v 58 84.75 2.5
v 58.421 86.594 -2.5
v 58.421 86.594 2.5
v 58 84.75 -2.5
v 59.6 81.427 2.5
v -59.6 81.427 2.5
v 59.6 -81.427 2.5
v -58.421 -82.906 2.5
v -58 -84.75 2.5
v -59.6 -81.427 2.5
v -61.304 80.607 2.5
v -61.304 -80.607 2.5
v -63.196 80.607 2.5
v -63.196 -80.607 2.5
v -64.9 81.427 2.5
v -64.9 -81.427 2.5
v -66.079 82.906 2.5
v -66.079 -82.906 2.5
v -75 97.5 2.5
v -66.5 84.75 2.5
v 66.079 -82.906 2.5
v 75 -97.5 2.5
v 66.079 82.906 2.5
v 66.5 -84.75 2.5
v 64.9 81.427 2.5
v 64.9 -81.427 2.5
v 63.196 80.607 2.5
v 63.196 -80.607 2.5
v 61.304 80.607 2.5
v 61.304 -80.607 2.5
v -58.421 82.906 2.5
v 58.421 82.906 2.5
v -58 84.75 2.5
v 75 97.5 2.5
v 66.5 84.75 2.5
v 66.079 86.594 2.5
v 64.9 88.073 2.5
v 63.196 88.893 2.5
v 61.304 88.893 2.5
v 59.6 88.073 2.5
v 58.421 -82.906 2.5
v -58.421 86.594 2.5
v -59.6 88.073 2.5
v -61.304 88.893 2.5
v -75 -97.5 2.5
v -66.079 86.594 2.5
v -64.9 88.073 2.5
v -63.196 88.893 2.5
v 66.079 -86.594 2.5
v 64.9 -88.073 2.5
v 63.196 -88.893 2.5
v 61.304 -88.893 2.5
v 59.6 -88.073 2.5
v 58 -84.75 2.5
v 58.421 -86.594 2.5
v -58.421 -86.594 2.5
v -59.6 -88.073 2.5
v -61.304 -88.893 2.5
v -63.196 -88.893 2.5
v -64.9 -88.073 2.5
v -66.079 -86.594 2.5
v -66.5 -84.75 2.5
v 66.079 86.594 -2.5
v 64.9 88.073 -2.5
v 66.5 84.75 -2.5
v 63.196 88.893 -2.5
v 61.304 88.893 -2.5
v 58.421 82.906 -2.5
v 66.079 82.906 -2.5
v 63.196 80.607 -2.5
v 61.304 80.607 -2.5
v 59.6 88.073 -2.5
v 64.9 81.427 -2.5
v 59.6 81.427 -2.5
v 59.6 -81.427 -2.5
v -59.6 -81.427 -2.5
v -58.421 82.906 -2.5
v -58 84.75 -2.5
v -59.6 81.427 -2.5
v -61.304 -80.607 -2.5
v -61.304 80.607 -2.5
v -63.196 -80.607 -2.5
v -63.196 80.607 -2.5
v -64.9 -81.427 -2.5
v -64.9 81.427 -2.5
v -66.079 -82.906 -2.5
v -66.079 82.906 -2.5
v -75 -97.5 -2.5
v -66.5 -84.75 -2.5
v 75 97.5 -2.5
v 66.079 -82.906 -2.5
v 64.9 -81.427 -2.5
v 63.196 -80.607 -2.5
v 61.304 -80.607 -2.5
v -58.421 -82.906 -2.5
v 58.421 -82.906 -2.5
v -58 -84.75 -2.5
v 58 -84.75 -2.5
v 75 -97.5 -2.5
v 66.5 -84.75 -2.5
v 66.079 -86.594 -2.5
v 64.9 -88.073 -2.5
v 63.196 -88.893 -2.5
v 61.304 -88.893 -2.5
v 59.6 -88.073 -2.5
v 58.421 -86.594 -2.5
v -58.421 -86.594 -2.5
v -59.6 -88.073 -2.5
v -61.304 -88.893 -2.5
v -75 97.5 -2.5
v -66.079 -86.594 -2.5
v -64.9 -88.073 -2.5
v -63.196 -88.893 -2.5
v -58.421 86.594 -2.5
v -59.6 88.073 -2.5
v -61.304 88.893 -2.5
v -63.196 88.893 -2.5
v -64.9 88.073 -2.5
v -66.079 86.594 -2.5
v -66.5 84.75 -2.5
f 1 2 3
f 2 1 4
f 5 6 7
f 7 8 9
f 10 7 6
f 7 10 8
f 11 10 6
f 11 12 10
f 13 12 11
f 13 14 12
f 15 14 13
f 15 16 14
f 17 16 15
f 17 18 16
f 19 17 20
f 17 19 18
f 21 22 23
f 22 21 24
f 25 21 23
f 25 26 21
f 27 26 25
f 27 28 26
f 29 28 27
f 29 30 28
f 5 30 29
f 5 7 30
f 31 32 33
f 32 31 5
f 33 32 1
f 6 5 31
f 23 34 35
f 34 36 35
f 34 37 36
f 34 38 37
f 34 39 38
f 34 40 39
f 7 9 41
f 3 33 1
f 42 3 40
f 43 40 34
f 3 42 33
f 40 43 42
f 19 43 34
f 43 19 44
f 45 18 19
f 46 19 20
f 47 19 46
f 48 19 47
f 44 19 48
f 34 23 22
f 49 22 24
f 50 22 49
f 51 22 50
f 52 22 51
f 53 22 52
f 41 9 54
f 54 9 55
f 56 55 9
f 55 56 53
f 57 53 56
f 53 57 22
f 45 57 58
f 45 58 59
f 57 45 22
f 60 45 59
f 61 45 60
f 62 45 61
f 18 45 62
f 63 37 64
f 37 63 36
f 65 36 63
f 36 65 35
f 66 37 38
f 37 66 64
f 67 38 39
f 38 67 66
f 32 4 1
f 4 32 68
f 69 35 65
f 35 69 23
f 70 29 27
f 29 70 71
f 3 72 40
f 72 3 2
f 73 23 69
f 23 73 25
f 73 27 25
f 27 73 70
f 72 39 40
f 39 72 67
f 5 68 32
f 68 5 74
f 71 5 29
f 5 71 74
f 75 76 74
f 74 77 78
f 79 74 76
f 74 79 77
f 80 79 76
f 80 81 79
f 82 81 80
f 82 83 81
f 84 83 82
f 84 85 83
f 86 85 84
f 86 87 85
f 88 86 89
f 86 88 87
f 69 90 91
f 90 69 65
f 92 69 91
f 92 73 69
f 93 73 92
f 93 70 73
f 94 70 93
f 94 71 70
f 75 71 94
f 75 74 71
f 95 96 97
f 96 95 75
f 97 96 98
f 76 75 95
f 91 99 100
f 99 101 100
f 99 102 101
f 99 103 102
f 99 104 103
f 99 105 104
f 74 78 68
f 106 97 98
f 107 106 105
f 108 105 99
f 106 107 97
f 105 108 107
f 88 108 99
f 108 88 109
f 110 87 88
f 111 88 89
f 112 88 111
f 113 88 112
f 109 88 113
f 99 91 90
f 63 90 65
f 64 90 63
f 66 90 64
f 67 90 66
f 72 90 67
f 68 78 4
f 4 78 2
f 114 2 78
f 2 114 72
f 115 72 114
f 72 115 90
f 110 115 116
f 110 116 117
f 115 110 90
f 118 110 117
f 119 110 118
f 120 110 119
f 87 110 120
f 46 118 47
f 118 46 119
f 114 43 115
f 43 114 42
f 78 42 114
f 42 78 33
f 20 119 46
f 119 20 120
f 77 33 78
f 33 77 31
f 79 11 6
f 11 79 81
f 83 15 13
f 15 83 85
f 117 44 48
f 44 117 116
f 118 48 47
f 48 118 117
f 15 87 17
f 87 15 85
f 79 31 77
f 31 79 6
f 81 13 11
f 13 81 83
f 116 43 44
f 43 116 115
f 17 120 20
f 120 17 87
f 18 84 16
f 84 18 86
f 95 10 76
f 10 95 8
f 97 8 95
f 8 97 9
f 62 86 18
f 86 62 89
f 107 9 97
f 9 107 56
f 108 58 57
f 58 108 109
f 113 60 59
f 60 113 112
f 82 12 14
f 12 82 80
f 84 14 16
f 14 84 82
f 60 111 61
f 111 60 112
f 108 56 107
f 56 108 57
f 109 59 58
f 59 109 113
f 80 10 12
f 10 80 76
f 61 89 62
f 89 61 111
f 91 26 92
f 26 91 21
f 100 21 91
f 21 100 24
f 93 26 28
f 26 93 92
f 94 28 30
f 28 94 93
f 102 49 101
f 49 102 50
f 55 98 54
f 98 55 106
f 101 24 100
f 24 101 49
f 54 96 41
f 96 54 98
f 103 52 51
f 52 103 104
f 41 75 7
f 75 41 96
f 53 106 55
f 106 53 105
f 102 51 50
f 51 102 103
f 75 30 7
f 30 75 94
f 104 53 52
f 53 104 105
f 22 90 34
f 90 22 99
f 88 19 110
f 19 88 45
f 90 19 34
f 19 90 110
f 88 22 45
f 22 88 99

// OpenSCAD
// Generated by SolidPython 1.1.3 on 2023-12-20 14:17:19


difference() {
	cube(center = true, size = [150, 195.0000000000, 5]);
	union() {
		translate(v = [62.2500000000, 84.7500000000]) {
			cylinder(center = true, h = 5, r = 4.2500000000);
		}
		translate(v = [-62.2500000000, 84.7500000000]) {
			cylinder(center = true, h = 5, r = 4.2500000000);
		}
		translate(v = [-62.2500000000, -84.7500000000]) {
			cylinder(center = true, h = 5, r = 4.2500000000);
		}
		translate(v = [62.2500000000, -84.7500000000]) {
			cylinder(center = true, h = 5, r = 4.2500000000);
		}
	}
}
/***********************************************
*********      SolidPython code:      **********
************************************************
 
import solid
import numpy as np
import numbers
import pudb
from solid.utils import *
import viewscad
import subprocess
import os
import os.path as osp
import math
import sys

chamfer_extrude=solid.import_scad("./chamfer_extrude.scad")
chamfer_extrude=chamfer_extrude.chamfer_extrude
r = viewscad.Renderer(width=800, height=800)

def debug(model,f_name,path="/home/ts/code/projects/mfd/designs/debug"):
    solid.scad_render_to_file(model,osp.join(path,f_name)+".scad")
#generate position list of wells using offset from center
wells_pos_from_center_4 = lambda offset: [[-offset,offset],
                                        [offset, offset],
                                        [-offset, -offset],
                                        [offset, -offset]]
#wells_pos_from_center_2 = lambda offset: [[0,offset],
#                                        [0, -offset]]
wells_pos_from_center_2 = lambda offset: [[offset,0],
                                        [-offset,0]]

def make_well(dims,shape=None,height=None,dxf=False):
    def circle_cylinder():
        if dxf or (height is None):
            well = solid.circle(r=dims, segments=64)
        else:
            well = solid.cylinder(r=dims, h=height, segments=64, center = True)
        return well
    if dims is None:
        sys.exit("radius needs to be a number")
    if isinstance(dims, numbers.Number):
        well =circle_cylinder()
    elif len(dims)==1:
        if isinstance(dims[1], numbers.Number):
            well =circle_cylinder()
        else:
            sys.exit("radius needs to be a number")
    elif len(dims)==2:
        well = solid.square(dims,center = True)
    elif len(dims)==3:
        well = solid.cube(dims, center = True)
    return well

def wells_top_bottom(center_gap,device_dims=None,shape=None,height=None, positions = None, dxf = False,well_shape=None):
    if well_shape == None:
        well_shape = make_well(device_dims,shape=shape,height=height,dxf=dxf)
    wells = []
    if positions is None:
        offset = radius+radius/2.0
        positions = wells_pos_from_center_2(offset)
    if dxf or (height is None):
        height = 0
    for position in positions:
        if dxf:
            wells.append(solid.translate([position[0],position[1]])(well_shape))
        else:
            wells.append(solid.translate([position[0],position[1],height/2.0])(well_shape))
    return  union()(*wells)

#place wells in four corners 
def four_corner(radius,height=None, positions = None, dxf = False):
    #if well pos not specified set
    #to equally spaced by half radius
    if positions is None:
        offset = radius+radius/2.0
        positions = wells_pos_from_center_4(offset)
    if dxf or (height is None):
        height = 0
    #make wells at positions with specified radius and height
    wells = []
    for position in positions:
        #make circle if making dxf
        if dxf:
            well_shape = solid.circle(r=radius, segments=64)
            well_shape = solid.translate([position[0],position[1]])(well_shape)
        #if stl make cylinder
        else:
            well_shape = solid.cylinder(r=radius, h=height, segments=64, center = True)
            well_shape = solid.translate([position[0],position[1],height/2.0])(well_shape)
        wells.append(well_shape)
    return  union()(*wells)

#generate channels 
def make_channels(length,width,height=0,num_chans=1,max_chans=None,spacing=None, dxf = False,
                  rotate_channels=False):
    if dxf or (height is None):
        height = 0
    #if channel gap not defined, is equal to
    if spacing is None: spacing = width
    #calculate number of channels if fitting max num within given width
    if not max_chans is None:
        import math
        num_chans = math.floor((max_chans-spacing)/(width+spacing))
    #get total width of channel section  
    total_width = (width*num_chans)+(spacing*(num_chans-1))

    #make template channel
    #if rotate_channels: width, length = length, width
    if dxf:
        channel_t = solid.square([length,width],center = True)
    else:
        channel_t = solid.cube([length,width,height], center = True)

    #if number channels is even, offset the first channel to center its gap
    if num_chans % 2 == 0: centering = -(width/2.0+spacing/2.0)
    else: centering = 0
    #move template channel up to align bottom at z = 0 
    #and offset center if necessary
    if dxf:
        channel_t = solid.translate([0,centering])(channel_t)
    else:
        channel_t = solid.translate([0,centering,height/2.0])(channel_t)

    #if rotate_channels: length,width = width,length
    #start making the channels
    channels = []
    for i in range(num_chans):
        #if i=0 there is no translation
        #if i=1, we make the first channel adjacent to second
        direction = i

        #if i>=1, we add channels alternating left and right
        if i >= 1:
            direction = -(i/2.0)
            if i % 2 == 1: direction = (-direction)+0.5
                
        #make channel at right position and add it to channel list
        translation_coords = [0,direction*(width+spacing)]
        #if rotate_channels: translation_coords = [direction*(width+spacing),0]
        if dxf:
            channel = solid.translate(translation_coords)(channel_t)
        else:
            channel = solid.translate([*translation_coords,0])(channel_t)
        channels.append(channel)
    
    #group all channels as one object
    channels = union()(*channels)
    #compute the x,y,z dimensions in order to pass as arguments 
    #for construction of other parts of device (such as the chambers)
    measurements = {'x':(length/2.0,-length/2.0),
                    'y':(total_width/2.0,-total_width/2.0)}
    if not dxf:
        measurements['z'] = (height,0)
    if rotate_channels:
        channels = solid.rotate(90)(channels)
        measurements['x'],measurements['y']=measurements['y'],measurements['x']
    return channels,measurements

def make_chambers(msrs,height=None,extra=0,len_until=None,width=None, dxf = False):
    #computes x,y,z length
    total = lambda x : abs(x[0]) + abs(x[1])
    
    #if specific height if specified
    #otherwise use same height as channels
    if dxf:
        pass
    elif not height is None:
        msrs['z'] = (height,0)
    else:
        msrs['z'] = (0,0)
        
    #make copy of measurements from channels to modify chamber dimensions 
    #and add length to chambers as specified
    chamber_dims = msrs.copy()
    #calculate length of chamber to reach specified offset
    if not len_until is None:
        chamber_len = len_until-(msrs['x'][0])
    #or add specified length to channel length (if not specified, adds 0)
    else:
        chamber_len = msrs['x'][0]+extra
    #set the chamber length based 
    chamber_dims['x'] = (chamber_len/2.0,-(chamber_len/2.0))
    #compute final dimensions of chamber
    if not width is None:
        chamber_dims['y'] = (width/2.0,-width/2.0)
    chamber_dims = [total(size) for size in chamber_dims.values()]
        
    #calculate chamber translation offset to place adjacent to channels
    chamber_trslt = msrs['x'][0]+(chamber_len/2.0)
    #compute chamber translation coordinates to align with channels
    #x = 1 moves chamber above channels
    #x = -1 moves chamber below channels
    if dxf:
        trslt = lambda x : [x*(chamber_trslt),0]
    else:
        trslt = lambda x : [x*(chamber_trslt),0,msrs['z'][0]/2.0]
    
    #function to make chamber at top or at bottom 
    if dxf:
        move = lambda x : solid.translate(trslt(x))(solid.square(chamber_dims, center = True) )
    else:
        move = lambda x : solid.translate(trslt(x))(solid.cube(chamber_dims,center = True))
    #make top and bottom chambers and return them as grouped
    top = move(1)
    bottom = move(-1)
    #chambers=solid.rotate(90)(solid.union()(top,bottom))
    chambers=(solid.union()(top,bottom))

    return chambers

#create alignment features 
def alignment_features(unit,dims,grid_size, mask_size = None, alignment = "hollow", units_from_center = (2.5,2.5), corner_len=None):
    width = grid_size[0]*dims[0]
    length = grid_size[1]*dims[1]
    if mask_size is None and corner_len is None:
        corner_len = (dims[0] + dims[1]) /2 / 8
    corner = lambda thickness_div : solid.union()( solid.square([corner_len,corner_len/thickness_div],center=False), solid.square([corner_len/thickness_div,corner_len],center=False) )
    
    def make_full(thickness_div):
        thickness = corner_len/thickness_div
        tr = solid.translate([0, 0, 0 ])(solid.rotate(180)(corner(thickness_div)))
        tr = solid.translate([thickness/2,thickness/2,0])(tr)
        bl = solid.translate([0, 0, 0 ])(solid.rotate(0)(corner(thickness_div)))
        bl = solid.translate([-thickness/2,-thickness/2,0])(bl)
        return solid.union()(tr,bl)
    
    def make_hollow(thickness_div):
        thickness = corner_len/(thickness_div/2)
        inner = make_full(thickness_div)
        outer = make_full(thickness_div/2)
        hollow = outer - inner 
        return hollow
    
    center = (width /2 , length/2)
    mask_pos = lambda x,y : (center[0] + x*(float(units_from_center[0])*dims[0]), center[1] + y*(float(units_from_center[1])*dims[1]))
    positions = []
    positions.append(mask_pos(1,0))
    positions.append(mask_pos(0,1))
    positions.append(mask_pos(-1,0))
    positions.append(mask_pos(0,-1))
    make_mask = lambda mtype : make_hollow(8) if mtype == "hollow" else make_full(8)
    masks = [ solid.translate([*position,0])(make_mask(alignment)) for position in positions]
    
    solid.scad_render_to_file(solid.union()(*masks),"./designs/open_chamber/masks.scad")
    #return unit - solid.union()(*masks)
    return solid.union()(*masks,unit)

def create_outline(thickness, array, dims, grid_size,):
    width = grid_size[0]*dims[0] + thickness *2
    length = grid_size[1]*dims[1] + thickness *2
    outer = solid.translate([-thickness, -thickness,0])(solid.square([width, length]))
    return outer-array

def create_wall(wall_thickness, outline_thickness, dims, grid_size, wall_height = 2000, dxf = False):
    inner_width = grid_size[0]*dims[0] + outline_thickness *2
    inner_length = grid_size[1]*dims[1] + outline_thickness *2
    outer_width = inner_width + wall_thickness * 2
    outer_length = inner_length + wall_thickness * 2
    outer_pos_x = -outline_thickness-wall_thickness
    outer_pos_y = -outline_thickness-wall_thickness
    inner_pos_x = -outline_thickness
    inner_pos_y = -outline_thickness
    if dxf:
        inner_wall = solid.translate([inner_pos_x,
                                      inner_pos_y,
                                      0])(solid.square([inner_width, inner_length]))
        outer_wall = solid.translate([outer_pos_x,
                                      outer_pos_y,
                                      0])(solid.square([outer_width, outer_length]))

        return outer_wall-inner_wall
    else:
        inner_wall = solid.translate([inner_pos_x,
                                      inner_pos_y,
                                      0])(solid.cube([inner_width, inner_length,wall_height]))
        outer_wall = solid.translate([outer_pos_x,
                                      outer_pos_y,
                                      0])(solid.cube([outer_width, outer_length,wall_height]))

        return outer_wall-inner_wall, {'wall_height': wall_height,
                                       'wall_thickness': wall_thickness,
                                       'inner_width':inner_width,
                                       'inner_length': inner_length,
                                       'outer_width': outer_width,
                                       'outer_length': outer_length,
                                       'outer_pos_x' : outer_pos_x,
                                       'outer_pos_y' : outer_pos_y,
                                       'inner_pos_x' : inner_pos_x,
                                       'inner_pos_y' : inner_pos_y}

def create_thicker_wall(wall_thickness, outer_wall_offset, wall_dims, dims, grid_size, height_start = .2, height_end=2, dxf = False):
    addon_wall,thicker_wall_dims = create_wall(wall_thickness, outer_wall_offset, dims, grid_size, wall_height=height_end-height_start, dxf = False)
    addon_wall = solid.translate([0,0,height_start])(addon_wall)

    thicker_wall_dims['wall_height'] = height_end
    thicker_wall_dims['wall_thickness'] = wall_dims['wall_thickness'] + wall_thickness
    return addon_wall, thicker_wall_dims
 
def add_lock_to_wall(wall,wall_dims,y_offset = 0,cut_ratio=0.7,L_length=3, gap_ratio=0.05, axis="x",width_ratio=1/2):
    # Makes L shape
    def make_L(max_length,length_thickness,max_width,width_thickness,height,y_offset):
        length = solid.cube([max_length,length_thickness,height])
        width = solid.cube([width_thickness,max_width,height])
        width = solid.translate([max_length-(width_thickness),0,0])(width)
        L = solid.union()(width,length)
        debug(L,"L")
        if axis == "x":
            L = solid.rotate(-90)(L)
            L = solid.translate([0,max_length,0])(L)
        else:
            L = solid.rotate(-180)(L)
            L = solid.translate([max_length,max_width,0])(L)
        return solid.translate([0,0,y_offset])(L)
    
    lock_length = L_length
    lock_width = wall_dims['wall_thickness']*width_ratio
    lock_length_thickness = lock_width/2
    lock_width_thickness = lock_width/2
    L_lock = make_L(lock_length,lock_length_thickness,lock_width,lock_width_thickness, wall_dims['wall_height']-y_offset, y_offset)
    
    margin_space = lock_length - lock_length*(1-gap_ratio)
    key_length = lock_length-margin_space
    key_length_thickness = lock_length_thickness-(margin_space*2)
    key_width = lock_width-(margin_space*2)
    key_width_thickness = lock_width_thickness-(margin_space*2)
    L_key = make_L(key_length,key_length_thickness,key_width,key_width_thickness, wall_dims['wall_height']-y_offset, y_offset)
    L_key = solid.translate([margin_space,margin_space,0])(L_key)
    L = solid.union()(L_lock,L_key)
    debug(L,"L")
    
    #Make cube to be used as negative to split frame in a half
    #Can choose if making left or right negative, specify ratio of split
    def make_negative(right,cut_ratio):
        if axis == "x":
            if right:
                length = wall_dims['outer_length']*(1-cut_ratio)
                pos_x = wall_dims['outer_pos_x']+(wall_dims['outer_length']*cut_ratio)
            else:
                length = wall_dims['outer_length']*(cut_ratio)
                pos_x = wall_dims['outer_pos_x'] 
            negative = solid.cube([wall_dims['outer_width'],length, wall_dims['wall_height']])
            negative = solid.translate([wall_dims['outer_pos_y'],pos_x,0])(negative)
        else:
            if right:
                length = wall_dims['outer_width']*(1-cut_ratio)
                pos_x = wall_dims['outer_pos_y']+(wall_dims['outer_width']*cut_ratio)
            else:
                length = wall_dims['outer_width']*(cut_ratio)
                pos_x = wall_dims['outer_pos_y'] 
            negative = solid.cube([length,wall_dims['outer_length'], wall_dims['wall_height']])
            negative = solid.translate([pos_x,wall_dims['outer_pos_x'],0])(negative)
        return negative, pos_x, length 
                      
    #Make negatives
    negative_right, right_half_pos_x, right_half_length = make_negative(True,cut_ratio)
    negative_left, left_half_pos_x, right_half_length = make_negative(False,cut_ratio)
    #Make halves
    left_half = solid.difference()(wall,negative_right)
    right_half = solid.difference()(wall,negative_left)
    def place_L(L, L_length,L_width):
        #Place L on top wall       
        offset_to_center = (wall_dims['wall_thickness']-L_width)/2
        if axis == "x":
            y_pos_top = (wall_dims['outer_pos_y'] +
                    wall_dims['outer_width'] - 
                    L_width - offset_to_center)
            top_L = solid.translate([y_pos_top,
                                     right_half_pos_x-(L_length),
                                     0])(L)
            #Place L on bottom wall       
            y_pos_bottom = wall_dims['outer_pos_y']+offset_to_center
            bottom_L = solid.translate([y_pos_bottom,
                                        right_half_pos_x-L_length,
                                        0])(L)
        else:
            y_pos_top = (wall_dims['outer_pos_x'] +
                    wall_dims['outer_length'] -
                    (L_width+offset_to_center))
            top_L = solid.translate([right_half_pos_x-L_length,
                                     y_pos_top,
                                     0])(L)
            #Place L on bottom wall       
            y_pos_bottom = wall_dims['outer_pos_y']+offset_to_center
            bottom_L = solid.translate([right_half_pos_x-L_length,
                                        y_pos_bottom,
                                        0])(L)
        return bottom_L, top_L
    #Make complimentary L pieces through union and differences
    #Make Lock
    bottom_L_lock, top_L_lock = place_L(L_lock,L_length,lock_width)
    left_half = solid.difference()(left_half,bottom_L_lock)
    left_half = solid.difference()(left_half,top_L_lock)
    #Make Key
    bottom_L_key, top_L_key = place_L(L_key,L_length,lock_width)
    right_half = solid.union()(right_half,bottom_L_key)
    right_half = solid.union()(right_half,top_L_key)
    return left_half, right_half


#build a row x col grid of containment units
def make_unit_array(unit,dims,grid_size, dxf = False, alignment = None, mask_size = None,
                    units_from_center = None,alignment_offset=None, alignment_mark_size=1):
    units = []
    for col in range(grid_size[1]):
        for row in range(grid_size[0]):
            if dxf:
                units.append(solid.translate([row*dims[0],col*dims[1]])(unit))
            else:
                units.append(solid.translate([row*dims[0],col*dims[1],dims[2]/2.0])(unit))
    array = solid.union()(*units)
    if (not alignment is None) and dxf:
        if not alignment_offset is None:
            array = solid.translate([alignment_offset[0],alignment_offset[1]])(array)
        array = alignment_features(array,dims, grid_size, alignment = alignment, mask_size = None, units_from_center = units_from_center,corner_len=alignment_mark_size)
        if not alignment_offset is None:
            array = solid.translate([-alignment_offset[0],-alignment_offset[1]])(array)
    return array


def make_taylor(wells_pos = wells_pos_from_center_4(2.25), well_rad = 1.5 ,
                well_height = 2, chan_w = 0.01, chan_l = 1, chan_h = 0.010 ,
                chan_gap = 0.040, max_chans = None,num_chans=100, chamber_height  = 0.100,
                columns = 1, rows = 1, chamber_len_until=2.25, add_channels = True, add_wells = True, 
                add_chambers = True, save_path = "./", alignment = None, units_from_center = 2,
                mask_size = None, render_stl = False, outline_thickness = 0.050, dxf = True,
                wall_height = 15, wall_thickness = 0.95, casing_x=9, casing_y=9, casing_z=0,rotate_units=0):

    dims = [casing_x, casing_y, casing_z]
    wells = four_corner(well_rad,well_height, dxf = dxf, positions = wells_pos)
    debug(wells,"wells")
    channels, msrs = make_channels(chan_l,chan_w,chan_h,dxf=dxf, spacing = chan_gap, max_chans=max_chans,num_chans=num_chans)
    debug(channels,"channels")
    chambers = make_chambers(msrs,dxf = dxf, height=chamber_height,len_until=chamber_len_until)
    debug(chambers,"chambers")

    #add together and render
    device_parts = []
    if add_channels:
        device_parts.append(channels)
    if add_wells:
        device_parts.append(wells)
    if add_chambers:
        device_parts.append(chambers)
    device=union()(*device_parts)
    device = rotate(rotate_units)(device)

    device=solid.translate([dims[0]/2.0,dims[1]/2.0,0])(device)
    channels = rotate(rotate_units)(channels)
    channels=solid.translate([dims[0]/2,dims[1]/2,0])(channels)
    chambers_wells = union()(wells,chambers)
    chambers_wells = rotate(rotate_units)(chambers_wells)
    chambers_wells=solid.translate([dims[0]/2,dims[1]/2,0])(chambers_wells)

    file_name = str(rows)+'x'+str(columns)+'_units_'
    grid_size = [rows,columns]

    if alignment:
        alignment="full"
    device = make_unit_array(device,dims,grid_size, dxf=dxf, alignment = alignment,
                                 units_from_center = units_from_center)
    channels = make_unit_array(channels,dims,grid_size, dxf=dxf, alignment = alignment,
                                 units_from_center = units_from_center)
    if alignment=="full":
        alignment="hollow"

    chambers_wells = make_unit_array(chambers_wells,dims,grid_size, dxf=dxf, alignment = alignment,
                                 units_from_center =units_from_center)

    def save_model(model,prefix):
        model_fname = os.path.abspath(save_path+prefix+"_"+file_name+".scad")
        solid.scad_render_to_file(model,model_fname)
        return model_fname

    wells_fname = save_model(wells,"wells")
    channels_fname = save_model(channels,"channels")
    device_fname = save_model(device,"device")
    chambers_wells_fname = save_model(chambers_wells,"chambers_wells")
    return (chambers_wells,chambers_wells_fname), (channels,channels_fname), (device,device_fname)

def make_device(design='open',rows=8,columns=6,wells_pos = 4.5,well_offset=3.2, well_rad=3.2,well_height=0.1,
                chan_l=1,chan_w=0.01,chan_h=0.01,chan_gap=0.015,num_chans=101,dxf=True,save_path="./designs/open_chamber/",
                casing_x=9.0,casing_y=18.0,casing_z=0,rotate_units=90,units_from_center=(3,1),chamber_len_until=4.5,
                chamber_width=None,alignment=True, add_wells=True, add_channels=True,add_chambers=True,well_shape=None):

    dims = [casing_x, casing_y, casing_z]
    if design == "open":
        wells_pos=wells_pos_from_center_2(wells_pos)
        wells = wells_top_bottom(well_offset*2,device_dims=well_rad,height=well_height, dxf = dxf, positions = wells_pos,well_shape=well_shape)
    elif design == "closed":
        wells_pos=wells_pos_from_center_4(wells_pos)
        debug(wells,"wells")
        wells = four_corner(well_offset,well_height,device_dims=well_rad, dxf = dxf, positions = wells_pos)
    else:
        print(design+" is not a valid design.\n Choose valid design: 'open' or 'closed'")
        exit()
    wells = rotate(rotate_units)(wells)
    wells=solid.translate([dims[0]/2,dims[1]/2,0])(wells)
    debug(wells,"wells")

    channels, msrs = make_channels(chan_l,chan_w,chan_h,dxf=dxf, spacing = chan_gap, num_chans=num_chans,rotate_channels=False)
    channels = rotate(rotate_units)(channels)
    channels=solid.translate([dims[0]/2,dims[1]/2,0])(channels)

    chambers=make_chambers(msrs,height=None,extra=0,len_until=chamber_len_until, width=chamber_width,dxf = dxf)
    chambers = rotate(rotate_units)(chambers)
    chambers=solid.translate([dims[0]/2,dims[1]/2,0])(chambers)

    device_parts = []
    if add_channels:
        device_parts.append(channels)
    if add_wells:
        device_parts.append(wells)
    if add_chambers:
        device_parts.append(chambers)
    device = union()(*device_parts)
    #device = rotate(rotate_units)(device)
    #device=solid.translate([dims[0]/2.0,dims[1]/2.0,0])(device)

    chambers_wells = []
    if add_chambers:
        chambers_wells.append(chambers)
    if add_wells:
        chambers_wells.append(wells)
    chambers_wells = union()(*chambers_wells)
    #chambers_wells = union()(wells,chambers)
    #chambers_wells = rotate(rotate_units)(chambers_wells)
    #chambers_wells=solid.translate([dims[0]/2,dims[1]/2,0])(chambers_wells)

    file_name = str(rows)+'x'+str(columns)+'_units_'

    grid_size = [rows,columns]
    if alignment:
        alignment="full"
    device = make_unit_array(device,dims,grid_size, dxf=dxf, alignment = alignment,
                                 units_from_center = units_from_center)
    channels = make_unit_array(channels,dims,grid_size, dxf=dxf, alignment = alignment,
                                 units_from_center = units_from_center)
    if alignment=="full":
        alignment="hollow"

    chambers_wells = make_unit_array(chambers_wells,dims,grid_size, dxf=dxf, alignment = alignment,
                                 units_from_center =units_from_center)

    def save_model(model,prefix):
        model_fname = os.path.abspath(save_path+prefix+"_"+file_name+".scad")
        solid.scad_render_to_file(model,model_fname)
        return model_fname

    wells_fname = save_model(wells,"wells")
    channels_fname = save_model(channels,"channels")
    device_fname = save_model(device,"device")
    chambers_wells_fname = save_model(chambers_wells,"chambers_wells")
    return (chambers_wells,chambers_wells_fname), (channels,channels_fname), (device,device_fname)


def make_open_chamber(rows=8,columns=6,wells_pos = wells_pos_from_center_2(4.5), well_rad=3.2,well_height=0.1,
                      chan_l=1,chan_w=0.01,chan_h=0.01,chan_gap=0.015,num_chans=101,dxf=True,save_path="./designs/open_chamber/",
                      casing_x=9.0,casing_y=18.0,casing_z=0,rotate_units=90,units_from_center=(3,1),chamber_len_until=4.5,
                      chamber_width=None,alignment=True, add_wells=True, add_channels=True,add_chambers=True,well_shape=None):

    dims = [casing_x, casing_y, casing_z]
    wells = wells_top_bottom(well_rad,height=well_height, dxf = dxf, positions = wells_pos, well_shape=well_shape)
    channels, msrs = make_channels(chan_l,chan_w,chan_h,dxf=dxf, spacing = chan_gap, num_chans=num_chans,rotate_channels=False)
    chambers=make_chambers(msrs,height=None,extra=0,len_until=chamber_len_until, width=chamber_width,dxf = dxf)
    debug(chambers,"chambers")
    device_parts = []
    if add_channels:
        device_parts.append(channels)
    if add_wells:
        device_parts.append(wells)
    if add_chambers:
        device_parts.append(chambers)
    device = union()(*device_parts)
    device = rotate(rotate_units)(device)
    device=solid.translate([dims[0]/2.0,dims[1]/2.0,0])(device)
    channels = rotate(rotate_units)(channels)
    channels=solid.translate([dims[0]/2,dims[1]/2,0])(channels)
    chambers_wells = union()(wells,chambers)
    chambers_wells = rotate(rotate_units)(chambers_wells)
    chambers_wells=solid.translate([dims[0]/2,dims[1]/2,0])(chambers_wells)

    file_name = str(rows)+'x'+str(columns)+'_units_'

    grid_size = [rows,columns]
    if alignment:
        alignment="full"
    device = make_unit_array(device,dims,grid_size, dxf=dxf, alignment = alignment,
                                 units_from_center = units_from_center)
    channels = make_unit_array(channels,dims,grid_size, dxf=dxf, alignment = alignment,
                                 units_from_center = units_from_center)
    if alignment=="full":
        alignment="hollow"

    chambers_wells = make_unit_array(chambers_wells,dims,grid_size, dxf=dxf, alignment = alignment,
                                 units_from_center =units_from_center)

    def save_model(model,prefix):
        model_fname = os.path.abspath(save_path+prefix+"_"+file_name+".scad")
        solid.scad_render_to_file(model,model_fname)
        return model_fname

    wells_fname = save_model(wells,"wells")
    channels_fname = save_model(channels,"channels")
    device_fname = save_model(device,"device")
    chambers_wells_fname = save_model(chambers_wells,"chambers_wells")
    return (chambers_wells,chambers_wells_fname), (channels,channels_fname), (device,device_fname)

def to_dxf(scad_path):
    dxf_path = scad_path.replace(".scad",".dxf")
    subprocess.call(["openscad", "-o", dxf_path, scad_path])
    import ezdxf
    temp_dxf = ezdxf.readfile(dxf_path)
    temp_dxf.saveas(dxf_path)

#def make_walls(diameter,thickness,grid_size,dims,height=20,segments=256,make_inner=True):
#    wafer_wall_out = solid.cylinder(r=diameter/2,h=height, segments=segments)
#    wafer_wall_in = solid.cylinder(r=(diameter/2-thickness),h=height, segments=segments)
#    wafer_wall = solid.difference()(wafer_wall_out,wafer_wall_in)
#    wafer_wall = solid.translate([grid_size[1]*dims[1]/2.0,grid_size[0]*dims[0]/2.0])(wafer_wall)
#
#    vertical_wall_length = grid_size[1]*dims[1]
#    horizontal_wall_length = grid_size[0]*dims[0]
#    vertical_wall = solid.cube([vertical_wall_length,thickness,height],center = True)
#    vertical_wall = solid.translate([vertical_wall_length/2,0,height/2])(vertical_wall)
#    horizontal_wall = solid.cube([thickness,horizontal_wall_length,height],center = True)
#    horizontal_wall = solid.translate([0,vertical_wall_length/2,height/2])(horizontal_wall)
#    walls = []
#    walls.append(horizontal_wall)
#    walls.append(vertical_wall)
#    for col in range(grid_size[1]):
#        if col == grid_size[1]-1: 
#            walls.append(solid.translate([0,(col+1)*dims[1]])(vertical_wall))
#        elif col > 0 and col < grid_size[1]-1 and make_inner==True:
#            walls.append(solid.translate([0,(col+1)*dims[1]])(vertical_wall))
#    for row in range(grid_size[0]):
#        if row == grid_size[0]-1: 
#            walls.append(solid.translate([(row+1)*dims[0],0])(horizontal_wall))
#        elif row > 0 and row < grid_size[0]-1 and make_inner==True:
#            walls.append(solid.translate([(row+1)*dims[0],0])(horizontal_wall))
#    walls = union()(*walls)
#    wafer_walls = union()(walls,wafer_wall)
#    return walls,wafer_wall,wafer_walls

def make_walls(diameter,thickness,grid_size,dims,height=20,segments=256,make_inner=True,padx=0,pady=0):
    wafer_wall_out = solid.cylinder(r=diameter/2,h=height, segments=segments)
    wafer_wall_in = solid.cylinder(r=(diameter/2-thickness),h=height, segments=segments)
    wafer_wall = solid.difference()(wafer_wall_out,wafer_wall_in)
    wafer_wall = solid.translate([grid_size[1]*dims[1]/2.0,grid_size[0]*dims[0]/2.0])(wafer_wall)

    vertical_wall_length = grid_size[0]*dims[0]+padx
    horizontal_wall_length = grid_size[1]*dims[1]+pady
    vertical_wall = solid.cube([vertical_wall_length,thickness,height],center = True)
    vertical_wall = solid.translate([vertical_wall_length/2-pady/2,-padx/2,height/2])(vertical_wall)
    horizontal_wall = solid.cube([thickness,horizontal_wall_length,height],center = True)
    horizontal_wall = solid.translate([-pady/2,horizontal_wall_length/2-padx/2,height/2])(horizontal_wall)
    walls = []
    walls.append(horizontal_wall)
    walls.append(vertical_wall)
    for col in range(grid_size[1]):
        if col == grid_size[1]-1: 
            walls.append(solid.translate([0,(col+1)*dims[1]+pady])(vertical_wall))
        elif col > 0 and col < grid_size[1]-1 and make_inner==True:
            walls.append(solid.translate([0,(col+1)*dims[1]])(vertical_wall))
    for row in range(grid_size[0]):
        if row == grid_size[0]-1: 
            walls.append(solid.translate([(row+1)*dims[0]+padx,0])(horizontal_wall))
        elif row > 0 and row < grid_size[0]-1 and make_inner==True:
            walls.append(solid.translate([(row+1)*dims[0],0])(horizontal_wall))
    walls = union()(*walls)
    wafer_walls = union()(walls,wafer_wall)
    return walls,wafer_wall,wafer_walls

def save_model(model,base_path,base_name,dxf=True):
    if not os.path.exists(base_path):
        os.makedirs(base_path)
    dxf_path=osp.join(base_path,base_name+".scad")
    solid.scad_render_to_file(model,osp.join(dxf_path))
    if dxf:
        to_dxf(dxf_path)

def make_wafer(diameter,flat_len,thickness):
    wafer = solid.cylinder(r1=diameter/2,r2=diameter/2,h=thickness,segments=512,)()
    x_start_flat=(flat_len/2)
    y_start_flat = math.sqrt(((diameter/2)**2) - (x_start_flat**2) )
    height_delete_flat=diameter/2-y_start_flat
    flat_delete = solid.cube([flat_len,height_delete_flat,thickness],center=False)()
    flat_delete = solid.translate([-flat_len/2,y_start_flat,0])(flat_delete)
    wafer = solid.difference()(wafer,flat_delete)
    wafer = solid.rotate(90)(wafer)
    return wafer

def add_wafer_to_mask(wafer_size,flat_len,mask,grid_size,dims,wafer_line_thickness=0.1,outer_mask_thickness=5,alignment_offset=None):
    def make_wafer_mask(wafer_size,flat_len):
        wafer_mask = make_wafer(wafer_size,flat_len,1)
        wafer_mask = solid.projection()(wafer_mask)
        wafer_mask = solid.translate([grid_size[0]*dims[0]/2.0,grid_size[1]*dims[1]/2.0])(wafer_mask)
        if not alignment_offset is None:
            wafer_mask = solid.translate([-alignment_offset[0],-alignment_offset[1]])(wafer_mask)
        return wafer_mask

    inner_wafer_line_mask = make_wafer_mask(wafer_size-wafer_line_thickness/2,flat_len)
    outer_wafer_line_mask = make_wafer_mask(wafer_size+wafer_line_thickness/2,flat_len)
    outer_wafer_mask = make_wafer_mask(wafer_size+outer_mask_thickness,flat_len)
    outer_wafer_mask = solid.difference()(outer_wafer_mask,outer_wafer_line_mask)
    wafer_mask = solid.union()(outer_wafer_mask,inner_wafer_line_mask)

    return solid.difference()(wafer_mask,mask)

def make_posts(post_shape,post_height):
    posts = solid.linear_extrude(height=post_height)(post_shape)
    return posts

def make_wafer_empty(diameter,flat_len,thickness,margin,notch_len=20,notch_height=5,oversize=1.01):
    diameter*=oversize
    flat_len*=oversize
    wafer = make_wafer(diameter,flat_len,thickness)
    holder = solid.cylinder(r1=diameter/2+margin,r2=diameter/2+margin,h=thickness,segments=512)()
    holder = solid.difference()(holder,wafer)

    x_start_flat=(flat_len/2)
    y_start_flat = math.sqrt(((diameter/2)**2) - (x_start_flat**2) )
    height_delete_flat=diameter/2-y_start_flat
    notch = solid.cube([notch_len,notch_height,thickness],center=False)()
    notch = solid.translate([-notch_len/2,y_start_flat,0])(notch)
    notch = solid.rotate(90)(notch)
    return solid.difference()(holder,notch)

def wafer_print_calibration(diameter,thickness,height,z_offset):
    circles = []
    radii = []
    radii.append(diameter/2.0*0.8)
    radii.append(diameter/2.0*0.6)
    radii.append(diameter/2.0*0.4)
    radii.append(diameter/2.0*0.2)
    for radius in radii:
        inner = solid.cylinder(r1=radius-(thickness/2.0),r2=radius-(thickness/2.0),h=thickness,segments=512,)()
        outer = solid.cylinder(r1=radius+(thickness/2.0),r2=radius+(thickness/2.0),h=thickness,segments=512,)()
        diff = solid.difference()(outer,inner)
        circles.append(diff)
    circles = solid.union()(*circles)
    circles = solid.translate([0,0,z_offset])(circles)
    return circles

def make_rack(wells,dims,grid_size,alignment_offset,rack_x,rack_y,rack_thickness,bolt_width,add_bolts=True):

    #get X and Y dimensions of gride of pipette tips
    X_len = dims[0]*grid_size[0]
    Y_len = dims[1]*grid_size[1]
    #make rack
    rack = solid.cube([rack_x,rack_y,rack_thickness],center=True)

    if add_bolts:
    #add bolt holes
        bolt_hole=solid.cylinder(r=bolt_width/2,h=rack_thickness,center=True)()
        bolt_holes = []
        bolt_holes.append(solid.translate([rack_x/2-1.5*bolt_width,rack_y/2-1.5*bolt_width])(bolt_hole))
        bolt_holes.append(solid.translate([-rack_x/2+1.5*bolt_width,rack_y/2-1.5*bolt_width])(bolt_hole))
        bolt_holes.append(solid.translate([-rack_x/2+1.5*bolt_width,-rack_y/2+1.5*bolt_width])(bolt_hole))
        bolt_holes.append(solid.translate([rack_x/2-1.5*bolt_width,-rack_y/2+1.5*bolt_width])(bolt_hole))
        bolt_holes = solid.union()(*bolt_holes)
        rack=solid.difference()(rack,bolt_holes)
    rack_support = rack

    #center rack with pipette holes
    rack = solid.translate([0,0,rack_thickness/2])(rack)
    rack = solid.translate([X_len/2,Y_len/2])(rack)
    rack = solid.translate([-alignment_offset[0],-alignment_offset[1]])(rack)
    wells = solid.linear_extrude(height=rack_thickness)(wells)
    rack = solid.difference()(rack,wells)
    return rack, rack_support

def make_pillar(wells,dims,grid_size,alignment_offset,rack_x,rack_y,pillar_height,rack_thickness,bolt_width,add_bolts=True,taper_angle=1,bolt_position_corner=1.5):

    #get X and Y dimensions of gride of pipette tips
    X_len = dims[0]*grid_size[0]
    Y_len = dims[1]*grid_size[1]
    #make rack
    rack = solid.cube([rack_x,rack_y,rack_thickness],center=True)
    
    if add_bolts:
    #add bolt holes
        bolt_hole=solid.cylinder(r=bolt_width/2,h=rack_thickness,center=True)()
        bolt_holes = []
        bolt_holes.append(solid.translate([rack_x/2-bolt_position_corner*bolt_width,rack_y/2-bolt_position_corner*bolt_width])(bolt_hole))
        bolt_holes.append(solid.translate([-rack_x/2+bolt_position_corner*bolt_width,rack_y/2-bolt_position_corner*bolt_width])(bolt_hole))
        bolt_holes.append(solid.translate([-rack_x/2+bolt_position_corner*bolt_width,-rack_y/2+bolt_position_corner*bolt_width])(bolt_hole))
        bolt_holes.append(solid.translate([rack_x/2-bolt_position_corner*bolt_width,-rack_y/2+bolt_position_corner*bolt_width])(bolt_hole))
        bolt_holes = solid.union()(*bolt_holes)
        rack=solid.difference()(rack,bolt_holes)
    rack_support = rack

    #center rack with pipette holes
    #rack = solid.translate([0,0,-rack_thickness])(rack)
    rack = solid.translate([X_len/2,Y_len/2])(rack)
    rack = solid.translate([-alignment_offset[0],-alignment_offset[1]])(rack)
    if not taper_angle == 0:
        wells=chamfer_extrude(pillar_height,taper_angle,segments=20)(wells)
    else:
        wells = solid.linear_extrude(height=pillar_height)(wells)
    rack = solid.union()(rack,wells)
    return rack, rack_support

def deg_taper_len(height,deg):
    if not deg == 0:
        return height*math.tan(math.radians(deg))
    else:
        return 0

def make_outline(inner_dims,wall_thickness,grid_size,dims,alignment_offset):
    inner_dims=np.array(inner_dims)
    inner_outline=solid.square(inner_dims,center=True)
    outer_dims=inner_dims+wall_thickness
    outer_outline=solid.square(outer_dims,center=True)
    outline=solid.difference()(outer_outline,inner_outline)
    outline=solid.translate([grid_size[0]*dims[0]/2.0,grid_size[1]*dims[1]/2.0])(outline)
    return outline








 
 
************************************************/
